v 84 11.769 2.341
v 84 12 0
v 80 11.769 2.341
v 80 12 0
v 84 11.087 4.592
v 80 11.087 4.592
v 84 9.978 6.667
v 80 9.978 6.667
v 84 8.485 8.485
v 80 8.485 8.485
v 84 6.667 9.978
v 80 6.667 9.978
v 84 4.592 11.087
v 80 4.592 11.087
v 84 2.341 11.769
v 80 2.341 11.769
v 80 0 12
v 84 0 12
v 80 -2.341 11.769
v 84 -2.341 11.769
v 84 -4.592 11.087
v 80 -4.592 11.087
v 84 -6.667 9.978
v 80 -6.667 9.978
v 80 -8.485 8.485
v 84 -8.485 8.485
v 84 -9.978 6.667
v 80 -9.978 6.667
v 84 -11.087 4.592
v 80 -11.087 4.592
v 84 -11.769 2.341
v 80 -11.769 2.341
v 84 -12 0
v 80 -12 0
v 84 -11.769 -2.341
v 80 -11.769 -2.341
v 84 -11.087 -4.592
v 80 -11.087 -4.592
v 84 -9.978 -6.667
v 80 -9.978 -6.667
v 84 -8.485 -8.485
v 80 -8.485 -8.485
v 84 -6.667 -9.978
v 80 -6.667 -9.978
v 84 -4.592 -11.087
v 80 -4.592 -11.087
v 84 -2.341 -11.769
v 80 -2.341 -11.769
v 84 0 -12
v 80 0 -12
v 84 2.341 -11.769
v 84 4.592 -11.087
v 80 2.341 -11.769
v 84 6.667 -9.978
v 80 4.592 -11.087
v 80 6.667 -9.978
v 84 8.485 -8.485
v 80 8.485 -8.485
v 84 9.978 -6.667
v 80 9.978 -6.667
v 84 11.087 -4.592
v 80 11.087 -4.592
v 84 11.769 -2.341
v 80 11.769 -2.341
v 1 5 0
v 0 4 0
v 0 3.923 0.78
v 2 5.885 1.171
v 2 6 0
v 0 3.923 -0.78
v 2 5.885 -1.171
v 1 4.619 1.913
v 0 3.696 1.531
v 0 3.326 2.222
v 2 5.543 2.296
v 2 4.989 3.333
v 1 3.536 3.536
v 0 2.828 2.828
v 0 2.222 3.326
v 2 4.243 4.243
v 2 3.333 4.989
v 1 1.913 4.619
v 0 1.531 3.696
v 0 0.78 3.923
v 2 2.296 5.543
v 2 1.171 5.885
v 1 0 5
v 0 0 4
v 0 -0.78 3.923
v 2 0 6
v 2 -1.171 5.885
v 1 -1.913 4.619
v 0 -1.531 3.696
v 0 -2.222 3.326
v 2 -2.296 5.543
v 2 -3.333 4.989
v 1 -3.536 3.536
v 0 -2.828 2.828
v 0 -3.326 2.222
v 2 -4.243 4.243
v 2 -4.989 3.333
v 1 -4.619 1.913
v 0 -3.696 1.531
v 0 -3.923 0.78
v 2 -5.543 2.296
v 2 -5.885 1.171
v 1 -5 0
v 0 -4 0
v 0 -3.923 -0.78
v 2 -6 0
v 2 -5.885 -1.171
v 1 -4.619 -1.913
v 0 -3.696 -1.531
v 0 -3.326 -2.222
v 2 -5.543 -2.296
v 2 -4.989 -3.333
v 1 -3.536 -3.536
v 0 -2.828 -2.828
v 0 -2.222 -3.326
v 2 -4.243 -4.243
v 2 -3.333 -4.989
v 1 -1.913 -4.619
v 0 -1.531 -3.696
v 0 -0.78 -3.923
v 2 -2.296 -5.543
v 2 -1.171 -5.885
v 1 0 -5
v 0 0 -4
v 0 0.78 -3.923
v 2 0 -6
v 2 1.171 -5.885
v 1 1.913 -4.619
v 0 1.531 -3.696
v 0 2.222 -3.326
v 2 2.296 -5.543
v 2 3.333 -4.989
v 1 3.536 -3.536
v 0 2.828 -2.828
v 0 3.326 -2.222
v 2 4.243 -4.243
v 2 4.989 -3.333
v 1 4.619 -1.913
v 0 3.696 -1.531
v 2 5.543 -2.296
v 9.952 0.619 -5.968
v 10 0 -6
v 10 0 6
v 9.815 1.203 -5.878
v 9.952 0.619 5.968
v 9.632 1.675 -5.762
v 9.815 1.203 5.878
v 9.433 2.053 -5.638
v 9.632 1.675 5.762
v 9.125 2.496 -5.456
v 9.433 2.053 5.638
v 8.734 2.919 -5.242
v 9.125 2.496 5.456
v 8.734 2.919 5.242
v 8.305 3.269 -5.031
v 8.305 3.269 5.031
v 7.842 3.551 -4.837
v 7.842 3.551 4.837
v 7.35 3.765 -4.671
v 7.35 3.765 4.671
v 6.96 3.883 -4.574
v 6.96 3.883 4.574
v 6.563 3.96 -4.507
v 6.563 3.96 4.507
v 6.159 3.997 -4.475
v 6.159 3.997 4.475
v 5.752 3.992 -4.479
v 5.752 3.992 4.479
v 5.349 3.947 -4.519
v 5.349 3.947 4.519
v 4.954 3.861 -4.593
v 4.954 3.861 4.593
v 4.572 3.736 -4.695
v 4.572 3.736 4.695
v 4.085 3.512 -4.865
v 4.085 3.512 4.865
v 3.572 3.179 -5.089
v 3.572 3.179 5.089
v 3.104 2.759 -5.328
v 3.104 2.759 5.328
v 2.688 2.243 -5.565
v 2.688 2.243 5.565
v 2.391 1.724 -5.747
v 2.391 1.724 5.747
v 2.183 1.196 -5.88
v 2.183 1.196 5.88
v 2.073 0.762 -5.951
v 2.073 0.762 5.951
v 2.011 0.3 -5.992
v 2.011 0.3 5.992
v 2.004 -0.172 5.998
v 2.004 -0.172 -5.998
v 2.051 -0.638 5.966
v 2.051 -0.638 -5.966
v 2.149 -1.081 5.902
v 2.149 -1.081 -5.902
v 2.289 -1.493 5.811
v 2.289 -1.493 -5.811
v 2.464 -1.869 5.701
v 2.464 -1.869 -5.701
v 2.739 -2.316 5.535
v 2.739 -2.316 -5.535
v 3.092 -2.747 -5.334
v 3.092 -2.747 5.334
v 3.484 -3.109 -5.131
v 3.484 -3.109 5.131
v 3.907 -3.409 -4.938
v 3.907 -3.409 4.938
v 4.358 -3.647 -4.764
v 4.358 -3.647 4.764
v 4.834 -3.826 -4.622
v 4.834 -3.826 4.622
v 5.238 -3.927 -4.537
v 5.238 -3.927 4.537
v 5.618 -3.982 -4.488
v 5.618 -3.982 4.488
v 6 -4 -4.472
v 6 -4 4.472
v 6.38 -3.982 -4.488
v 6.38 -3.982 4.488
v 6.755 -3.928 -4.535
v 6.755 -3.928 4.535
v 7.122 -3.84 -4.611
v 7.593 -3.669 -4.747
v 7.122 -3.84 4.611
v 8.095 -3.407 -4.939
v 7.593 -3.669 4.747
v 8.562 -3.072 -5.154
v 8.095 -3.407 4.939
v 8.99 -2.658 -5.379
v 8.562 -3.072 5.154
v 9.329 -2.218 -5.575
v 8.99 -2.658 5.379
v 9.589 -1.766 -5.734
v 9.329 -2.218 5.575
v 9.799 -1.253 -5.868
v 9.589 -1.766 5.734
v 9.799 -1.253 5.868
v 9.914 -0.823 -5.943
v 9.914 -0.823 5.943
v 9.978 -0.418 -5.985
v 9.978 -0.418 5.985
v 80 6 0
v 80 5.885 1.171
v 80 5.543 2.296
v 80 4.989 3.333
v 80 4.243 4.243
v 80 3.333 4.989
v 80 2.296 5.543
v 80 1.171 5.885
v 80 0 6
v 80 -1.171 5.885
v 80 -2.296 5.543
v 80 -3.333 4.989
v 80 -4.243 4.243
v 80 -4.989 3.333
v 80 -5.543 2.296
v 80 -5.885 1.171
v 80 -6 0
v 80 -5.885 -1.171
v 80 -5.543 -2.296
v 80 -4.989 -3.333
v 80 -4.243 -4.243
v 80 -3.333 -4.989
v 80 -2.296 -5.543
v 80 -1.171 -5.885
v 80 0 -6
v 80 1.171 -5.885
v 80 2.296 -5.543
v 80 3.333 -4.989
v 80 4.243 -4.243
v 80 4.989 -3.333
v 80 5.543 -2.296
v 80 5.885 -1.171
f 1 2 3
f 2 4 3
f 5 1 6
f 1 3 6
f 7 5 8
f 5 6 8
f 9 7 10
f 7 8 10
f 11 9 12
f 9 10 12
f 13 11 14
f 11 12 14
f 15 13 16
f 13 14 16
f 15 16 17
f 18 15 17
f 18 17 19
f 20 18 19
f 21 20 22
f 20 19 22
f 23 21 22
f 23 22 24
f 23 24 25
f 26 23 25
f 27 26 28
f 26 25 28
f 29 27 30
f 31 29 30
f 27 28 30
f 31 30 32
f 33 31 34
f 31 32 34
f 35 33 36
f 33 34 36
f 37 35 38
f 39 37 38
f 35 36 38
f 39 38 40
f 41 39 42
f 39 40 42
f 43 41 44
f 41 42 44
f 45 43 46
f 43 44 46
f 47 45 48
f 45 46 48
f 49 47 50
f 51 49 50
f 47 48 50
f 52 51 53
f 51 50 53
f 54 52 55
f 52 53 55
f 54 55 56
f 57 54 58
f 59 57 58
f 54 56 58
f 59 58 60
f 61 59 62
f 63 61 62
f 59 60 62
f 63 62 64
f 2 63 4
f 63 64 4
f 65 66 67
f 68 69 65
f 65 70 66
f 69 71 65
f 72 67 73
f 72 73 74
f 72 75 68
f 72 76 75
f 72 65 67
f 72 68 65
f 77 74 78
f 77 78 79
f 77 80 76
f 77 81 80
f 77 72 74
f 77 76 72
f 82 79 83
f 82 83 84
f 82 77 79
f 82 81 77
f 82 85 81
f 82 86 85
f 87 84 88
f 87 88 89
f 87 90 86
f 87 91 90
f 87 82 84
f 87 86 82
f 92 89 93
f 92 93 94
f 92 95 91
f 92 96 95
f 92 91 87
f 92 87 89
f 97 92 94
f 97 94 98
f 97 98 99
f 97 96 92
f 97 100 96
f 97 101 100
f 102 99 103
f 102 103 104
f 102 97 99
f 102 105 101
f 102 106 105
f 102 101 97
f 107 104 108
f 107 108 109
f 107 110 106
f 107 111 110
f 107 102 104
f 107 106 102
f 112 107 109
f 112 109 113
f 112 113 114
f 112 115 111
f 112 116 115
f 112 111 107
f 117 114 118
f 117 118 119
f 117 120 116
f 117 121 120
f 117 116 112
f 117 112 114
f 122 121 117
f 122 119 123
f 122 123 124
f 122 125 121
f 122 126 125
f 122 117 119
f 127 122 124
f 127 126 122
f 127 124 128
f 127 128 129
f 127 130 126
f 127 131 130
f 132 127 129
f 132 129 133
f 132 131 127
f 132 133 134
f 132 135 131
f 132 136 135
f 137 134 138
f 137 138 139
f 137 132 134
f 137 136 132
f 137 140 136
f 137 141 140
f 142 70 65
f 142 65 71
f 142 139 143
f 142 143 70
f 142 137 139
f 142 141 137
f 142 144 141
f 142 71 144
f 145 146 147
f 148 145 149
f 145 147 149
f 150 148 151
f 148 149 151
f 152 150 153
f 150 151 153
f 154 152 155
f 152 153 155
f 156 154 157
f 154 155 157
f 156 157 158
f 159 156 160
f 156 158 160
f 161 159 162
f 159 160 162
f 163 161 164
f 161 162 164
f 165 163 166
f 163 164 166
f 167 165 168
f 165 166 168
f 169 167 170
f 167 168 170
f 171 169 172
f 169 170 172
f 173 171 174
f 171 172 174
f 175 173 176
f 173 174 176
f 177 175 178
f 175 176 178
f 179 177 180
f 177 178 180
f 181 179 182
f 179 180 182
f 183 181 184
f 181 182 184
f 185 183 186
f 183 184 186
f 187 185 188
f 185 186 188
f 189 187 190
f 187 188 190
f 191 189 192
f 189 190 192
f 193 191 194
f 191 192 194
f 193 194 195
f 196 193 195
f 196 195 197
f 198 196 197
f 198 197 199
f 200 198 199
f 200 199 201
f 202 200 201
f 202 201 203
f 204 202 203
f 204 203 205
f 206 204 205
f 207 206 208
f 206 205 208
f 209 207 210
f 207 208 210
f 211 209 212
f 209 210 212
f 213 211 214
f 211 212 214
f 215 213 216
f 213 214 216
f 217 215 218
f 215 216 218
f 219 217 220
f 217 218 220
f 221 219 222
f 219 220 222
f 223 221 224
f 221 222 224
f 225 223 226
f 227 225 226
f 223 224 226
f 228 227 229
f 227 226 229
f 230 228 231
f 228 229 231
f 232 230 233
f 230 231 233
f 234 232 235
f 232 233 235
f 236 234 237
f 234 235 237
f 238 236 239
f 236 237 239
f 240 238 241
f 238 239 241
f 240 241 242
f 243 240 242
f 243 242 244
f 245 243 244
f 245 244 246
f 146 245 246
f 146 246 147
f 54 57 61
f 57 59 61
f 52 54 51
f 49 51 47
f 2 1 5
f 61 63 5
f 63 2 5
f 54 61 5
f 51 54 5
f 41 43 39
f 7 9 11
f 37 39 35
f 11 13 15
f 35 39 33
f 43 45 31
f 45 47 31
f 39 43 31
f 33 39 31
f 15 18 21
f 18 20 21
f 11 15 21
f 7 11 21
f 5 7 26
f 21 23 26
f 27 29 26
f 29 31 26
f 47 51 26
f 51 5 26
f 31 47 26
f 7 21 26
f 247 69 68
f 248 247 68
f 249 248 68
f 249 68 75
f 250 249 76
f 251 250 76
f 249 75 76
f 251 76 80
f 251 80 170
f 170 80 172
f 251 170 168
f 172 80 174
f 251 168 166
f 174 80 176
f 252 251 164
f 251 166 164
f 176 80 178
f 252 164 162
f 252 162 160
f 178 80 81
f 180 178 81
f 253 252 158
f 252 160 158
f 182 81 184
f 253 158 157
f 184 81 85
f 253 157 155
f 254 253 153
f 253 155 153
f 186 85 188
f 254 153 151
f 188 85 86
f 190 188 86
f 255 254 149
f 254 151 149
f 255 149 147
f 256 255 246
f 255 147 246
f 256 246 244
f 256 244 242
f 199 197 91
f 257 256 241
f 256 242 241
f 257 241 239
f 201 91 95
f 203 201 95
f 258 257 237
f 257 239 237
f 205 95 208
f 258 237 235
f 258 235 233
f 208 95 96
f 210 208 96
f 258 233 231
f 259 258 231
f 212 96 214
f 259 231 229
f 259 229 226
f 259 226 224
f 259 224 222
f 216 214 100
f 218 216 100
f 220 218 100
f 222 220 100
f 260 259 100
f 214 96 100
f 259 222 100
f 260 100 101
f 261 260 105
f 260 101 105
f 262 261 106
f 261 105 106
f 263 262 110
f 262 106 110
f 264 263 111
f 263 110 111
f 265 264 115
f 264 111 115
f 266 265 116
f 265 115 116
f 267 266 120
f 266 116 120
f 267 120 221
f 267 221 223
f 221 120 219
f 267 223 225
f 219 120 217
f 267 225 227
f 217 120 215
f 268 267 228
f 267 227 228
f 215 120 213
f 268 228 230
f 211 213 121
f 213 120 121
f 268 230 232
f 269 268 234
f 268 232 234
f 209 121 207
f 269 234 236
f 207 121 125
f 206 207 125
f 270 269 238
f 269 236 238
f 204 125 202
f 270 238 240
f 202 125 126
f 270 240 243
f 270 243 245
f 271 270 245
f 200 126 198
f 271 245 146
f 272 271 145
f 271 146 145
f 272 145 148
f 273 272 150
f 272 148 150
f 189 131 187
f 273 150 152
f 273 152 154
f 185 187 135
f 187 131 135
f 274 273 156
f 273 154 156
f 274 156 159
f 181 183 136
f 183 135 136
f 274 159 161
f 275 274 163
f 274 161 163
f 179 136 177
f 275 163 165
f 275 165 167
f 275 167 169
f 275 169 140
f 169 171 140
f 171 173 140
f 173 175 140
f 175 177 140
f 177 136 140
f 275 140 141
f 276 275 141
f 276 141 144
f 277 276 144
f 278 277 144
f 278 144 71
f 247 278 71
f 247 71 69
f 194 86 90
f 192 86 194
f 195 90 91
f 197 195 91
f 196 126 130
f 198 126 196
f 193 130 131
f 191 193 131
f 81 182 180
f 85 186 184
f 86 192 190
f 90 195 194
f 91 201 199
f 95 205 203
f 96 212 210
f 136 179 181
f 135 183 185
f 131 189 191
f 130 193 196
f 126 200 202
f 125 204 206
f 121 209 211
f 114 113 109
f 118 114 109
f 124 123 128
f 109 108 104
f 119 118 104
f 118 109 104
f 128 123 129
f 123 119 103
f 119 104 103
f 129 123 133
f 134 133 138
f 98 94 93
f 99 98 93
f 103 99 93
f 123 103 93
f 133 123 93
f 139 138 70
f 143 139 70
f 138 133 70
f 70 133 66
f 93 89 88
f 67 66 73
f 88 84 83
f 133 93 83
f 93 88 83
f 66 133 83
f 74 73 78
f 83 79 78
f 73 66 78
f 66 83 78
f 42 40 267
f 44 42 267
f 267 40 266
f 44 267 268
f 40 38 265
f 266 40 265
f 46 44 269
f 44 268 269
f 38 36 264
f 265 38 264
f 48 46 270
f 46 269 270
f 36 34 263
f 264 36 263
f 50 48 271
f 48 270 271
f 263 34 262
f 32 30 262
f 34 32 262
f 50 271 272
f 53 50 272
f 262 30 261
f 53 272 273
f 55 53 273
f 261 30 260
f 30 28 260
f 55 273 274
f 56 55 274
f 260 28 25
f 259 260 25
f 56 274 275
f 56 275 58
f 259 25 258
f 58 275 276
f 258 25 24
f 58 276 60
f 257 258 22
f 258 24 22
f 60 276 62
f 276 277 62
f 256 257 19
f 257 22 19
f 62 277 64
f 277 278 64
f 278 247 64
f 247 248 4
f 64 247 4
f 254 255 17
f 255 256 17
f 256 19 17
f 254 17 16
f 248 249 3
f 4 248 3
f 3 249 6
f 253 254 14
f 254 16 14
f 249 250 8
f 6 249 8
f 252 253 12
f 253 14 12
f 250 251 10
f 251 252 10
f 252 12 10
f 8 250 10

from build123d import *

# Parameters (mm, degrees)
F2_R     = 4
F3_DEPTH = 12.5
F4_SIZE  = 1.99999


# Not quite as in the source:
# - a fillet or chamfer is up to 0.001 mm smaller than in the source, because OpenCascade refuses the exact size


with BuildPart() as f1:
    # F0 (on Top) → F1 (revolve)
    with BuildSketch(Plane.XY):
        Polygon((0, 6), (0, 0), (84, 0), (84, 12), (80, 12), (80, 6), align=None)
    revolve(axis=Axis((42, 0, 0), (1, 0, 0)))

    # F2 (on Top) → F3 (cut, symmetric)
    with BuildSketch(Plane.XY):
        with Locations((6, 0)):
            Circle(F2_R)
    extrude(amount=F3_DEPTH, both=True, mode=Mode.SUBTRACT)

    # F4 (size 2 in the source; OpenCascade refuses exactly that, so slightly less here)
    f4_edges = [f1.edges().sort_by_distance(p)[0] for p in [
        (0, -6, 0),
    ]]
    chamfer(f4_edges, length=F4_SIZE)


solid = f1.part
